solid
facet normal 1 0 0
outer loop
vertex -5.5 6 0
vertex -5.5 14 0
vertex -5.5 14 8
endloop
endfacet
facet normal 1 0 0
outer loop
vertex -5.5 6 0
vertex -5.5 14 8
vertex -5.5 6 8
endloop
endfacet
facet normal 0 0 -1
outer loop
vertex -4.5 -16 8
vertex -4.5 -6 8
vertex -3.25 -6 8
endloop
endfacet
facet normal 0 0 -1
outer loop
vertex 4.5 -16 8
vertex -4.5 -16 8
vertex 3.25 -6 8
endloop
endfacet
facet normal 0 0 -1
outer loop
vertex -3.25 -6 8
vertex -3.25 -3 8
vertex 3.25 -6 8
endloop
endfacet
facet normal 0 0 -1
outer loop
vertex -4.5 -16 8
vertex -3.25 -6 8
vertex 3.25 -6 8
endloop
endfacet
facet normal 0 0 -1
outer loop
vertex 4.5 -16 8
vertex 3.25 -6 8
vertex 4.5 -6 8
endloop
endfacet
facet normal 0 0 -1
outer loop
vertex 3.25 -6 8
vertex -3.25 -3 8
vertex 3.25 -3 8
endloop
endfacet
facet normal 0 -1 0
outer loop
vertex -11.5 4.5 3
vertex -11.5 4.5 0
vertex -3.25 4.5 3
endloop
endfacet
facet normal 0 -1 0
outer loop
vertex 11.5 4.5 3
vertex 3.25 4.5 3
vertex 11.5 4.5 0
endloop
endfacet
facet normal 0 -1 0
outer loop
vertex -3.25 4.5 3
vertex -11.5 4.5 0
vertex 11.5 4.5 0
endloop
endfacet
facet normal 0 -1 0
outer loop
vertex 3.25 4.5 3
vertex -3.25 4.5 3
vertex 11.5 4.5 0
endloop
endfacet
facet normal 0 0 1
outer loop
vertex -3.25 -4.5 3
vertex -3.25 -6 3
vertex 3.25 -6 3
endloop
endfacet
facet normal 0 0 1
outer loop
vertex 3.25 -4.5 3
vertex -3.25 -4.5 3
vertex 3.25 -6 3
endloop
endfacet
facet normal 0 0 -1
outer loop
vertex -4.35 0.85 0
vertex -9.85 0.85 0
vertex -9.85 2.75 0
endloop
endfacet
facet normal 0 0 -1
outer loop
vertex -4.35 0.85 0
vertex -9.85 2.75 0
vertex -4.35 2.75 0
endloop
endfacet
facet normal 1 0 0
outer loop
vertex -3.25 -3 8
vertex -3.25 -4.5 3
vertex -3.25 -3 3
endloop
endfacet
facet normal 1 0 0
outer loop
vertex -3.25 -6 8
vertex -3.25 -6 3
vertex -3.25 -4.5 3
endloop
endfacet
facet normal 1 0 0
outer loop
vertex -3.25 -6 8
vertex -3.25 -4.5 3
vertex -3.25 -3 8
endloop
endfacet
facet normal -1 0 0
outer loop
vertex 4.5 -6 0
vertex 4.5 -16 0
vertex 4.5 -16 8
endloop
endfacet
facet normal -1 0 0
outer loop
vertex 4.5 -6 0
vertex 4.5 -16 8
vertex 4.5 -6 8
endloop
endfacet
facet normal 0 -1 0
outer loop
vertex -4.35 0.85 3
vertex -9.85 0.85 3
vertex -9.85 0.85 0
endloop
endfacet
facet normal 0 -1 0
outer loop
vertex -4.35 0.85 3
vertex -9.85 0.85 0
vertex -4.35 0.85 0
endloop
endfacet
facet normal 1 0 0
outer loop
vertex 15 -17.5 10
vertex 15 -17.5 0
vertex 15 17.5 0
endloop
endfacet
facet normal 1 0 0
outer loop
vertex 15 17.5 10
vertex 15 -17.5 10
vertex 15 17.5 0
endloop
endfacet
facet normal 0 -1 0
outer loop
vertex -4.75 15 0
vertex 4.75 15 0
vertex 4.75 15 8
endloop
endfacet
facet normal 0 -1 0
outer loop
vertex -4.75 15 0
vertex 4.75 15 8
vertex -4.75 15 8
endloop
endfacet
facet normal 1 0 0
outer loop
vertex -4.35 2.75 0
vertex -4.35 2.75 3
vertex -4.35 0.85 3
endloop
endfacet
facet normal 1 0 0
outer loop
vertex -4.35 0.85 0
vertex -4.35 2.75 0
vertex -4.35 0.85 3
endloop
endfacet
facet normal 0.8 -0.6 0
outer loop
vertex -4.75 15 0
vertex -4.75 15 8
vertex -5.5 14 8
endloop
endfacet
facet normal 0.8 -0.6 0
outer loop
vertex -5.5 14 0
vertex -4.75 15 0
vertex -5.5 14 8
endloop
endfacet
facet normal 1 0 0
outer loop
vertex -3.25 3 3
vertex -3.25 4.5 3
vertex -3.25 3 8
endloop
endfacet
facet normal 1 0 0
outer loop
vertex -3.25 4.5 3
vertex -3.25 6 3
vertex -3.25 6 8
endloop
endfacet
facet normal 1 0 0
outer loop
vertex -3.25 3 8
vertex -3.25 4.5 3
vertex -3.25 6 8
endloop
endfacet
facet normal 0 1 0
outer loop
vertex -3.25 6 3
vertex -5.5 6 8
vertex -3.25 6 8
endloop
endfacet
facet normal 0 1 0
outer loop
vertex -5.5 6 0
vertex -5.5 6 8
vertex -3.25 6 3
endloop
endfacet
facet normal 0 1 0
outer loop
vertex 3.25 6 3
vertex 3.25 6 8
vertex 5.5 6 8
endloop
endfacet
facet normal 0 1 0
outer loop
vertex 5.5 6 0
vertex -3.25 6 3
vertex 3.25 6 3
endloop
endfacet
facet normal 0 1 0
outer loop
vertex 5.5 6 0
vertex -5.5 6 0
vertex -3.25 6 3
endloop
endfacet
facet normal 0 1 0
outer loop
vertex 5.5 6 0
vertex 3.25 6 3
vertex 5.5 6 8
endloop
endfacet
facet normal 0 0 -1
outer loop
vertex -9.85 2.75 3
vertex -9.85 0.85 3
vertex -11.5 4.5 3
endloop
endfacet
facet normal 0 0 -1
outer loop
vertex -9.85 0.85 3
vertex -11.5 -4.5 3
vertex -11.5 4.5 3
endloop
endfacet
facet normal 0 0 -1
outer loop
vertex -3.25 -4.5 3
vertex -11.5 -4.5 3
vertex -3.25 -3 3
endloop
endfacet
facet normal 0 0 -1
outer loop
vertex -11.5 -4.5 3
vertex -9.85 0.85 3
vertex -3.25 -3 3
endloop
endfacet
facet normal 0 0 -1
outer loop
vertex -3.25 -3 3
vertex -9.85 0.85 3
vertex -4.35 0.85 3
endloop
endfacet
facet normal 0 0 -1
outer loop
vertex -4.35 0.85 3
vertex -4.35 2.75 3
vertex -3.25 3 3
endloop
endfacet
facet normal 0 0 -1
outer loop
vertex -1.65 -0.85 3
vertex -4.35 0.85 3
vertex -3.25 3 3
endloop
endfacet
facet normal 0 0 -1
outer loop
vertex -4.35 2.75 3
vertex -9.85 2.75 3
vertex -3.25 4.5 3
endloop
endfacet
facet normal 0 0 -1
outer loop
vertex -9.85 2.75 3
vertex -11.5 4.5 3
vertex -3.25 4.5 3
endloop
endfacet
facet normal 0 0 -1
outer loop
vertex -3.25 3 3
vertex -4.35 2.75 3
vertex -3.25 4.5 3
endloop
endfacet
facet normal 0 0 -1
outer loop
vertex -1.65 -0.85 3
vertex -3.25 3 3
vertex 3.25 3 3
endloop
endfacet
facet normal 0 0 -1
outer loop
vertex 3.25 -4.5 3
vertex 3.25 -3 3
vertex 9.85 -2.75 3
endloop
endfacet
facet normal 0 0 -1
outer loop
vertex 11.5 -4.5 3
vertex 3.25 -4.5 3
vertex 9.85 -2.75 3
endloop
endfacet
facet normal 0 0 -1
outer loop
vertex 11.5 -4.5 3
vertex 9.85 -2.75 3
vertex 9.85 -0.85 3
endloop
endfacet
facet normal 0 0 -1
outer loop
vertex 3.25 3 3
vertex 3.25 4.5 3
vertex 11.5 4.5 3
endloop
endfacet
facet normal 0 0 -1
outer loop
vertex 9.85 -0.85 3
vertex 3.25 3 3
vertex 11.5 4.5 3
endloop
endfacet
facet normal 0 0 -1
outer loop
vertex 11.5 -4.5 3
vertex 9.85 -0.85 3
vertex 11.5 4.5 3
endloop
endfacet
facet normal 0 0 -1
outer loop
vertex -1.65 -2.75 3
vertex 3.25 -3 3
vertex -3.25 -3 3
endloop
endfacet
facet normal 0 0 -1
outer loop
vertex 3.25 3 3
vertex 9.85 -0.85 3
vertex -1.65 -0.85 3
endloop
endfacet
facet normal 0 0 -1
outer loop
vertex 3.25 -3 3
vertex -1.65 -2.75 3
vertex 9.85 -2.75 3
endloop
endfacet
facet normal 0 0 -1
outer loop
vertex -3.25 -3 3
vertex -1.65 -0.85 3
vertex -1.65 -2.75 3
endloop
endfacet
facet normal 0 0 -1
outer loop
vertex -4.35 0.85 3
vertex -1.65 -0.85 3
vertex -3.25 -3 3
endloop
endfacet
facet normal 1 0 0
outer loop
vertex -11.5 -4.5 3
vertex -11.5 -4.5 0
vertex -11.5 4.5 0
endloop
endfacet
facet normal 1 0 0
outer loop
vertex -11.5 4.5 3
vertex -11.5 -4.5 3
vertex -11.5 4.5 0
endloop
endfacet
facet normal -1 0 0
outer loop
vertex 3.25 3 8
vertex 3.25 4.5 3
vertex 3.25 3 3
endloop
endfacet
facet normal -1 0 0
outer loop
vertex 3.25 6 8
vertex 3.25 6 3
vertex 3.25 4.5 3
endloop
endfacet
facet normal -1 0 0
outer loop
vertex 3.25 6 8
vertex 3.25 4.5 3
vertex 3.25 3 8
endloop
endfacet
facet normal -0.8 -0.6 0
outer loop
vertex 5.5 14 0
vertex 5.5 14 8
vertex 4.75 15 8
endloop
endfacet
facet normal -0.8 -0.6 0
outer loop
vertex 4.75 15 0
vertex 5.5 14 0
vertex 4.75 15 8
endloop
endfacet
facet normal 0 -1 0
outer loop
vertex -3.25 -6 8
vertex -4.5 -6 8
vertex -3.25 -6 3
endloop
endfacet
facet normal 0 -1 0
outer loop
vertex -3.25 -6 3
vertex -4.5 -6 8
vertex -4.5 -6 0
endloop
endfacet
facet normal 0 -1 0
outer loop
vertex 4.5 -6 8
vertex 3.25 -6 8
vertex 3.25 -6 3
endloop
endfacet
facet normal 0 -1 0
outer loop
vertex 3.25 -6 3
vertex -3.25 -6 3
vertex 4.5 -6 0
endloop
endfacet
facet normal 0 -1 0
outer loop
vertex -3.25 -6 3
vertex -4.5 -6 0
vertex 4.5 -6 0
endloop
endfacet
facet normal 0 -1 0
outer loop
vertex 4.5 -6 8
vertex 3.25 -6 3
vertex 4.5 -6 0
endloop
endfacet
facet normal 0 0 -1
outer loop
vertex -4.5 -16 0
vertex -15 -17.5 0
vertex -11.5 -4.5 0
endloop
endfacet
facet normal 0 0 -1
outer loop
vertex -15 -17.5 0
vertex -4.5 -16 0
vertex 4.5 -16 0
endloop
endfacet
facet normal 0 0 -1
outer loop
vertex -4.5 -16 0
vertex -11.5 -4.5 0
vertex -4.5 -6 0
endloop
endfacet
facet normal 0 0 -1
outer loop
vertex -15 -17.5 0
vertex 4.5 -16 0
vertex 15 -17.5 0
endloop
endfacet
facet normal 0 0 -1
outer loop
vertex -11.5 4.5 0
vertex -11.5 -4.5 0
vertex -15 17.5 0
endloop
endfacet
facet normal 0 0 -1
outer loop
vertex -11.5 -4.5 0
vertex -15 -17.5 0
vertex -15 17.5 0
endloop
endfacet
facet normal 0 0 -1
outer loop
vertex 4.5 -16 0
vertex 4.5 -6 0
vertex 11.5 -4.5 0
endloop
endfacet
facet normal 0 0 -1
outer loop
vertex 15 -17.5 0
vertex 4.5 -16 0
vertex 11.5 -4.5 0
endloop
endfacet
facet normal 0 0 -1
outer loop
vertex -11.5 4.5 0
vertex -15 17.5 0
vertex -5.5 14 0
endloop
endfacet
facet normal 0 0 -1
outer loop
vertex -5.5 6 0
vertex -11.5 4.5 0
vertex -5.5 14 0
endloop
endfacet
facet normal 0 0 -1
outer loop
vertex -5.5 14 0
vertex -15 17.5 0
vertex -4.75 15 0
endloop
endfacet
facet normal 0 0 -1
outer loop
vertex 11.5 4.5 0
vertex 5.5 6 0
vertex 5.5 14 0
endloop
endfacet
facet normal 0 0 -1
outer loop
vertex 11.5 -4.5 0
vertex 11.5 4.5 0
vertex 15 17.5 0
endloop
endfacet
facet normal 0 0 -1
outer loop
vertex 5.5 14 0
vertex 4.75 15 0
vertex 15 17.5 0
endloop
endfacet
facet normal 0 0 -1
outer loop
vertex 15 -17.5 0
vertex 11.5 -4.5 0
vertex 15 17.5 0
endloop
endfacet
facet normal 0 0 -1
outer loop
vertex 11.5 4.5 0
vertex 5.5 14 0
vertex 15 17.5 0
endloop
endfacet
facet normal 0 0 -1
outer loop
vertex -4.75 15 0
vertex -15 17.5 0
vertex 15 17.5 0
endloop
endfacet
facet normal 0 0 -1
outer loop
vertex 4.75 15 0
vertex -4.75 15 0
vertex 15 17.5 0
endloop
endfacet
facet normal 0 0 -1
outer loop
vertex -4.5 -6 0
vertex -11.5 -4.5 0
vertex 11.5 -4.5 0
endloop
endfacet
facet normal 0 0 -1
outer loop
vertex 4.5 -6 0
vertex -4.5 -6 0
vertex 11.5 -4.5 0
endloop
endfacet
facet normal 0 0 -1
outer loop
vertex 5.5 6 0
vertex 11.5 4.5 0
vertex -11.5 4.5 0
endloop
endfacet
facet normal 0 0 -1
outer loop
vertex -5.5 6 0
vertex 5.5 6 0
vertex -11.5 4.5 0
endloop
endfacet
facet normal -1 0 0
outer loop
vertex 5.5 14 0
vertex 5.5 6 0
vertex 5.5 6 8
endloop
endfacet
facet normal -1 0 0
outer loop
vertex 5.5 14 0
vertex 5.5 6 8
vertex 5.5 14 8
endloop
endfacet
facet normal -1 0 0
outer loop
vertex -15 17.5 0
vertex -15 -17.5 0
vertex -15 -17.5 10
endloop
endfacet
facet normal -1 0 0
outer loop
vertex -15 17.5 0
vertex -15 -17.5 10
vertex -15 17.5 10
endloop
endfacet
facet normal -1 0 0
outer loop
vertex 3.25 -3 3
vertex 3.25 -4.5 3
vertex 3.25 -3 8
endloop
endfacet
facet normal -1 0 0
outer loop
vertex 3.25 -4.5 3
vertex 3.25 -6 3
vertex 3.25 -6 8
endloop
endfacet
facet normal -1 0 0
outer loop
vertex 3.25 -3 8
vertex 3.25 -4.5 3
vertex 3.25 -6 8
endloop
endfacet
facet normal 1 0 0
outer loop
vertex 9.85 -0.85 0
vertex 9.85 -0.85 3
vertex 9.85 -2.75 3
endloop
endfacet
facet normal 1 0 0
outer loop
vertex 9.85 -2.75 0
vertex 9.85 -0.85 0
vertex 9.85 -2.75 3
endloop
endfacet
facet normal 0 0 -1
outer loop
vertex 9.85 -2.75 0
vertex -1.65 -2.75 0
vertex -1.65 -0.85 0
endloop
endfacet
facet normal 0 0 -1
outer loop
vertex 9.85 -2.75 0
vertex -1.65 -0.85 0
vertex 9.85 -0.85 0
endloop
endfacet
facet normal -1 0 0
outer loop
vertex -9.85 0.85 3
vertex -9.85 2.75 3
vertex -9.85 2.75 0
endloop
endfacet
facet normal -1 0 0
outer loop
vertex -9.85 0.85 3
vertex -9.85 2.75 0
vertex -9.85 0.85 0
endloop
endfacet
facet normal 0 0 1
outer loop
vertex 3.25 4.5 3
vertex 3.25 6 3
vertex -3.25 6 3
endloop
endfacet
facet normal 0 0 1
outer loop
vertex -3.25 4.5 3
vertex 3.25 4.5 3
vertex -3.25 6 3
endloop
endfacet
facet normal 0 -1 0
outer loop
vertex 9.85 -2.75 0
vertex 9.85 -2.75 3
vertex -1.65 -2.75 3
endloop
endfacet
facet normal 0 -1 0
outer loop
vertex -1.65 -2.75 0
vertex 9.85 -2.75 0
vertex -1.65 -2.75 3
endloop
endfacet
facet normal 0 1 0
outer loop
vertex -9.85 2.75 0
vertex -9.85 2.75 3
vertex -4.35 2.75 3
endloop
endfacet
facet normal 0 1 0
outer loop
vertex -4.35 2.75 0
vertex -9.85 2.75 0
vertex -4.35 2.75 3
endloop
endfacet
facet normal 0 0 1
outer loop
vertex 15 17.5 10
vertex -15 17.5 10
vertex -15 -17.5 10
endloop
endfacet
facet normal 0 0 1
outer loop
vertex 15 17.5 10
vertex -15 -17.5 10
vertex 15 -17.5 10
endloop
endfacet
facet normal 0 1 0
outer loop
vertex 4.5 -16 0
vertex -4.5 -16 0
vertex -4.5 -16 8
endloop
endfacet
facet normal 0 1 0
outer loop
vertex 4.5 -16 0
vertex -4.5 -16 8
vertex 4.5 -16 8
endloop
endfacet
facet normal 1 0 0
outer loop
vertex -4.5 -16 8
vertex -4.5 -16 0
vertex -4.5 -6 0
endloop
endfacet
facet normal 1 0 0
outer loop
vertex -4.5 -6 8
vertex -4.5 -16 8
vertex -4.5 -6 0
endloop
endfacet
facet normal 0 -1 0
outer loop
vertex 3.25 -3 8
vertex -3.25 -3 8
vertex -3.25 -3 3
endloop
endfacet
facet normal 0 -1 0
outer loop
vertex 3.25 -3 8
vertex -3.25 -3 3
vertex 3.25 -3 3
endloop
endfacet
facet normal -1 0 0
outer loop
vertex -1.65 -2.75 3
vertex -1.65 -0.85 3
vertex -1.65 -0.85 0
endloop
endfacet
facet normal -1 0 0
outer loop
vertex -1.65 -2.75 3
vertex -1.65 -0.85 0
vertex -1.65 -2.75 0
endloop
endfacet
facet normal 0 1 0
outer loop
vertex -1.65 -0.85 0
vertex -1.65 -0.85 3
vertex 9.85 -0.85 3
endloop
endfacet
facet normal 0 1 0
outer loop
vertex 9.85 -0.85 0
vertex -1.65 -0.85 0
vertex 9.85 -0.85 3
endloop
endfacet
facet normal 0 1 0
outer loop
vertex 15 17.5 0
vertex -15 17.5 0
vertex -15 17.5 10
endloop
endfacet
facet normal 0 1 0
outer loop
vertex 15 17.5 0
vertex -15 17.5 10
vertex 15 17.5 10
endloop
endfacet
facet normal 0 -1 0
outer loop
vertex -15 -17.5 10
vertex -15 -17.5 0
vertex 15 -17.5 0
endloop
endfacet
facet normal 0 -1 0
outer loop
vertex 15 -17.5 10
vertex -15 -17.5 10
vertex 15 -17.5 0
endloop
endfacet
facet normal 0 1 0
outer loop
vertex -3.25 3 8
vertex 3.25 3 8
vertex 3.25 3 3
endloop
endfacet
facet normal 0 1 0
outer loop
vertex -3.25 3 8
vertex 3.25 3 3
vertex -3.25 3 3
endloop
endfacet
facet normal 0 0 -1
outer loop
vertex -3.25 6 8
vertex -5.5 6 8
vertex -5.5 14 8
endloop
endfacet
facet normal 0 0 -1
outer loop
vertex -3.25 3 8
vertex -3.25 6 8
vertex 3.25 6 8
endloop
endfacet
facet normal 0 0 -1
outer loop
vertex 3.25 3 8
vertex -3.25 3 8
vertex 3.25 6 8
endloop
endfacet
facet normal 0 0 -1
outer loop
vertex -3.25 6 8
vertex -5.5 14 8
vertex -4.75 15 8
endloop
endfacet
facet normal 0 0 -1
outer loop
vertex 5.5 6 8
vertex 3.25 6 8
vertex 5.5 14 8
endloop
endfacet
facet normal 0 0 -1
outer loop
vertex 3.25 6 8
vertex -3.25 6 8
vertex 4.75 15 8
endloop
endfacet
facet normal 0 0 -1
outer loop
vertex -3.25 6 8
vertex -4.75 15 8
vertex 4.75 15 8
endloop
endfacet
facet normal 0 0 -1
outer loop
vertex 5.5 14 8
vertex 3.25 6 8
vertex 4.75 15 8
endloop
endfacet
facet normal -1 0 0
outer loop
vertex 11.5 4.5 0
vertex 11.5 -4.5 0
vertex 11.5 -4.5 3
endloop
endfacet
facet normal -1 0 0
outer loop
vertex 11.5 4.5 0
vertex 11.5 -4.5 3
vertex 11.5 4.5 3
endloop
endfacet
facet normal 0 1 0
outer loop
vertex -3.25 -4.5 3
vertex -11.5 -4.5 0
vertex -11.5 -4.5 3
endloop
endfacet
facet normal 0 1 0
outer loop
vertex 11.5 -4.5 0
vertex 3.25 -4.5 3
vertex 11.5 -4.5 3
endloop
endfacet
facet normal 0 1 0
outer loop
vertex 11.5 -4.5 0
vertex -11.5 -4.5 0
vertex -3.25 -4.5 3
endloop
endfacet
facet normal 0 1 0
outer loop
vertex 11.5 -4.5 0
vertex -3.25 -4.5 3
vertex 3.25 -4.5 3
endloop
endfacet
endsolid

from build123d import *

# Parameters (mm, degrees)
F1_W      = 30
F1_H      = 35
F2_DEPTH  = 10
F3_W      = 23
F3_H      = 9
F4_DEPTH  = 3
F6_DEPTH  = 8
F7_W      = 9
F7_H      = 10
F8_DEPTH  = 8
F9_W      = 5.75
F9_H      = 1.9
F9_W_2    = 5.5
F10_DEPTH = 3
F11_W     = 6.5
F11_H     = 5
F12_DEPTH = 3
F13_W     = 6.5
F13_H     = 5
F14_DEPTH = 3


with BuildPart() as f2:
    # F1 (on face) → F2 (new body)
    with BuildSketch(Plane.XY):
        Rectangle(F1_W, F1_H)
    extrude(amount=F2_DEPTH)

    # F3 (on face) → F4 (cut)
    with BuildSketch(Plane.XY):
        Rectangle(F3_W, F3_H)
    extrude(amount=F4_DEPTH, mode=Mode.SUBTRACT)

    # F5 (on face) → F6 (cut)
    with BuildSketch(Plane.XY):
        Polygon((-5.5, 14), (-5.5, 6), (5.5, 6), (5.5, 14), (4.75, 15), (-4.75, 15), align=None)
    extrude(amount=F6_DEPTH, mode=Mode.SUBTRACT)

    # F7 (on face) → F8 (cut)
    with BuildSketch(Plane.XY):
        with Locations((0, -11)):
            Rectangle(F7_W, F7_H)
    extrude(amount=F8_DEPTH, mode=Mode.SUBTRACT)

    # F9 (on face) → F10 (join, through all)
    with BuildSketch(Plane(origin=(0, 0, 3), x_dir=(1, 0, 0), z_dir=(0, 0, -1))):
        with Locations((6.975, 1.8)):
            Rectangle(F9_W, F9_H)
        with Locations((-7.1, -1.8)):
            Rectangle(F9_W_2, F9_H)
        with Locations((1.225, 1.8)):
            Rectangle(F9_W, F9_H)
    extrude(amount=F10_DEPTH)

    # F11 (on face) → F12 (cut)
    with BuildSketch(Plane(origin=(0, 6, 0), x_dir=(-1, 0, 0), z_dir=(0, 1, 0))):
        with Locations((0, 5.5)):
            Rectangle(F11_W, F11_H)
    extrude(amount=-F12_DEPTH, mode=Mode.SUBTRACT)

    # F13 (on face) → F14 (cut)
    with BuildSketch(Plane.XZ.offset(6)):
        with Locations((0, 5.5)):
            Rectangle(F13_W, F13_H)
    extrude(amount=-F14_DEPTH, mode=Mode.SUBTRACT)


solid = f2.part
